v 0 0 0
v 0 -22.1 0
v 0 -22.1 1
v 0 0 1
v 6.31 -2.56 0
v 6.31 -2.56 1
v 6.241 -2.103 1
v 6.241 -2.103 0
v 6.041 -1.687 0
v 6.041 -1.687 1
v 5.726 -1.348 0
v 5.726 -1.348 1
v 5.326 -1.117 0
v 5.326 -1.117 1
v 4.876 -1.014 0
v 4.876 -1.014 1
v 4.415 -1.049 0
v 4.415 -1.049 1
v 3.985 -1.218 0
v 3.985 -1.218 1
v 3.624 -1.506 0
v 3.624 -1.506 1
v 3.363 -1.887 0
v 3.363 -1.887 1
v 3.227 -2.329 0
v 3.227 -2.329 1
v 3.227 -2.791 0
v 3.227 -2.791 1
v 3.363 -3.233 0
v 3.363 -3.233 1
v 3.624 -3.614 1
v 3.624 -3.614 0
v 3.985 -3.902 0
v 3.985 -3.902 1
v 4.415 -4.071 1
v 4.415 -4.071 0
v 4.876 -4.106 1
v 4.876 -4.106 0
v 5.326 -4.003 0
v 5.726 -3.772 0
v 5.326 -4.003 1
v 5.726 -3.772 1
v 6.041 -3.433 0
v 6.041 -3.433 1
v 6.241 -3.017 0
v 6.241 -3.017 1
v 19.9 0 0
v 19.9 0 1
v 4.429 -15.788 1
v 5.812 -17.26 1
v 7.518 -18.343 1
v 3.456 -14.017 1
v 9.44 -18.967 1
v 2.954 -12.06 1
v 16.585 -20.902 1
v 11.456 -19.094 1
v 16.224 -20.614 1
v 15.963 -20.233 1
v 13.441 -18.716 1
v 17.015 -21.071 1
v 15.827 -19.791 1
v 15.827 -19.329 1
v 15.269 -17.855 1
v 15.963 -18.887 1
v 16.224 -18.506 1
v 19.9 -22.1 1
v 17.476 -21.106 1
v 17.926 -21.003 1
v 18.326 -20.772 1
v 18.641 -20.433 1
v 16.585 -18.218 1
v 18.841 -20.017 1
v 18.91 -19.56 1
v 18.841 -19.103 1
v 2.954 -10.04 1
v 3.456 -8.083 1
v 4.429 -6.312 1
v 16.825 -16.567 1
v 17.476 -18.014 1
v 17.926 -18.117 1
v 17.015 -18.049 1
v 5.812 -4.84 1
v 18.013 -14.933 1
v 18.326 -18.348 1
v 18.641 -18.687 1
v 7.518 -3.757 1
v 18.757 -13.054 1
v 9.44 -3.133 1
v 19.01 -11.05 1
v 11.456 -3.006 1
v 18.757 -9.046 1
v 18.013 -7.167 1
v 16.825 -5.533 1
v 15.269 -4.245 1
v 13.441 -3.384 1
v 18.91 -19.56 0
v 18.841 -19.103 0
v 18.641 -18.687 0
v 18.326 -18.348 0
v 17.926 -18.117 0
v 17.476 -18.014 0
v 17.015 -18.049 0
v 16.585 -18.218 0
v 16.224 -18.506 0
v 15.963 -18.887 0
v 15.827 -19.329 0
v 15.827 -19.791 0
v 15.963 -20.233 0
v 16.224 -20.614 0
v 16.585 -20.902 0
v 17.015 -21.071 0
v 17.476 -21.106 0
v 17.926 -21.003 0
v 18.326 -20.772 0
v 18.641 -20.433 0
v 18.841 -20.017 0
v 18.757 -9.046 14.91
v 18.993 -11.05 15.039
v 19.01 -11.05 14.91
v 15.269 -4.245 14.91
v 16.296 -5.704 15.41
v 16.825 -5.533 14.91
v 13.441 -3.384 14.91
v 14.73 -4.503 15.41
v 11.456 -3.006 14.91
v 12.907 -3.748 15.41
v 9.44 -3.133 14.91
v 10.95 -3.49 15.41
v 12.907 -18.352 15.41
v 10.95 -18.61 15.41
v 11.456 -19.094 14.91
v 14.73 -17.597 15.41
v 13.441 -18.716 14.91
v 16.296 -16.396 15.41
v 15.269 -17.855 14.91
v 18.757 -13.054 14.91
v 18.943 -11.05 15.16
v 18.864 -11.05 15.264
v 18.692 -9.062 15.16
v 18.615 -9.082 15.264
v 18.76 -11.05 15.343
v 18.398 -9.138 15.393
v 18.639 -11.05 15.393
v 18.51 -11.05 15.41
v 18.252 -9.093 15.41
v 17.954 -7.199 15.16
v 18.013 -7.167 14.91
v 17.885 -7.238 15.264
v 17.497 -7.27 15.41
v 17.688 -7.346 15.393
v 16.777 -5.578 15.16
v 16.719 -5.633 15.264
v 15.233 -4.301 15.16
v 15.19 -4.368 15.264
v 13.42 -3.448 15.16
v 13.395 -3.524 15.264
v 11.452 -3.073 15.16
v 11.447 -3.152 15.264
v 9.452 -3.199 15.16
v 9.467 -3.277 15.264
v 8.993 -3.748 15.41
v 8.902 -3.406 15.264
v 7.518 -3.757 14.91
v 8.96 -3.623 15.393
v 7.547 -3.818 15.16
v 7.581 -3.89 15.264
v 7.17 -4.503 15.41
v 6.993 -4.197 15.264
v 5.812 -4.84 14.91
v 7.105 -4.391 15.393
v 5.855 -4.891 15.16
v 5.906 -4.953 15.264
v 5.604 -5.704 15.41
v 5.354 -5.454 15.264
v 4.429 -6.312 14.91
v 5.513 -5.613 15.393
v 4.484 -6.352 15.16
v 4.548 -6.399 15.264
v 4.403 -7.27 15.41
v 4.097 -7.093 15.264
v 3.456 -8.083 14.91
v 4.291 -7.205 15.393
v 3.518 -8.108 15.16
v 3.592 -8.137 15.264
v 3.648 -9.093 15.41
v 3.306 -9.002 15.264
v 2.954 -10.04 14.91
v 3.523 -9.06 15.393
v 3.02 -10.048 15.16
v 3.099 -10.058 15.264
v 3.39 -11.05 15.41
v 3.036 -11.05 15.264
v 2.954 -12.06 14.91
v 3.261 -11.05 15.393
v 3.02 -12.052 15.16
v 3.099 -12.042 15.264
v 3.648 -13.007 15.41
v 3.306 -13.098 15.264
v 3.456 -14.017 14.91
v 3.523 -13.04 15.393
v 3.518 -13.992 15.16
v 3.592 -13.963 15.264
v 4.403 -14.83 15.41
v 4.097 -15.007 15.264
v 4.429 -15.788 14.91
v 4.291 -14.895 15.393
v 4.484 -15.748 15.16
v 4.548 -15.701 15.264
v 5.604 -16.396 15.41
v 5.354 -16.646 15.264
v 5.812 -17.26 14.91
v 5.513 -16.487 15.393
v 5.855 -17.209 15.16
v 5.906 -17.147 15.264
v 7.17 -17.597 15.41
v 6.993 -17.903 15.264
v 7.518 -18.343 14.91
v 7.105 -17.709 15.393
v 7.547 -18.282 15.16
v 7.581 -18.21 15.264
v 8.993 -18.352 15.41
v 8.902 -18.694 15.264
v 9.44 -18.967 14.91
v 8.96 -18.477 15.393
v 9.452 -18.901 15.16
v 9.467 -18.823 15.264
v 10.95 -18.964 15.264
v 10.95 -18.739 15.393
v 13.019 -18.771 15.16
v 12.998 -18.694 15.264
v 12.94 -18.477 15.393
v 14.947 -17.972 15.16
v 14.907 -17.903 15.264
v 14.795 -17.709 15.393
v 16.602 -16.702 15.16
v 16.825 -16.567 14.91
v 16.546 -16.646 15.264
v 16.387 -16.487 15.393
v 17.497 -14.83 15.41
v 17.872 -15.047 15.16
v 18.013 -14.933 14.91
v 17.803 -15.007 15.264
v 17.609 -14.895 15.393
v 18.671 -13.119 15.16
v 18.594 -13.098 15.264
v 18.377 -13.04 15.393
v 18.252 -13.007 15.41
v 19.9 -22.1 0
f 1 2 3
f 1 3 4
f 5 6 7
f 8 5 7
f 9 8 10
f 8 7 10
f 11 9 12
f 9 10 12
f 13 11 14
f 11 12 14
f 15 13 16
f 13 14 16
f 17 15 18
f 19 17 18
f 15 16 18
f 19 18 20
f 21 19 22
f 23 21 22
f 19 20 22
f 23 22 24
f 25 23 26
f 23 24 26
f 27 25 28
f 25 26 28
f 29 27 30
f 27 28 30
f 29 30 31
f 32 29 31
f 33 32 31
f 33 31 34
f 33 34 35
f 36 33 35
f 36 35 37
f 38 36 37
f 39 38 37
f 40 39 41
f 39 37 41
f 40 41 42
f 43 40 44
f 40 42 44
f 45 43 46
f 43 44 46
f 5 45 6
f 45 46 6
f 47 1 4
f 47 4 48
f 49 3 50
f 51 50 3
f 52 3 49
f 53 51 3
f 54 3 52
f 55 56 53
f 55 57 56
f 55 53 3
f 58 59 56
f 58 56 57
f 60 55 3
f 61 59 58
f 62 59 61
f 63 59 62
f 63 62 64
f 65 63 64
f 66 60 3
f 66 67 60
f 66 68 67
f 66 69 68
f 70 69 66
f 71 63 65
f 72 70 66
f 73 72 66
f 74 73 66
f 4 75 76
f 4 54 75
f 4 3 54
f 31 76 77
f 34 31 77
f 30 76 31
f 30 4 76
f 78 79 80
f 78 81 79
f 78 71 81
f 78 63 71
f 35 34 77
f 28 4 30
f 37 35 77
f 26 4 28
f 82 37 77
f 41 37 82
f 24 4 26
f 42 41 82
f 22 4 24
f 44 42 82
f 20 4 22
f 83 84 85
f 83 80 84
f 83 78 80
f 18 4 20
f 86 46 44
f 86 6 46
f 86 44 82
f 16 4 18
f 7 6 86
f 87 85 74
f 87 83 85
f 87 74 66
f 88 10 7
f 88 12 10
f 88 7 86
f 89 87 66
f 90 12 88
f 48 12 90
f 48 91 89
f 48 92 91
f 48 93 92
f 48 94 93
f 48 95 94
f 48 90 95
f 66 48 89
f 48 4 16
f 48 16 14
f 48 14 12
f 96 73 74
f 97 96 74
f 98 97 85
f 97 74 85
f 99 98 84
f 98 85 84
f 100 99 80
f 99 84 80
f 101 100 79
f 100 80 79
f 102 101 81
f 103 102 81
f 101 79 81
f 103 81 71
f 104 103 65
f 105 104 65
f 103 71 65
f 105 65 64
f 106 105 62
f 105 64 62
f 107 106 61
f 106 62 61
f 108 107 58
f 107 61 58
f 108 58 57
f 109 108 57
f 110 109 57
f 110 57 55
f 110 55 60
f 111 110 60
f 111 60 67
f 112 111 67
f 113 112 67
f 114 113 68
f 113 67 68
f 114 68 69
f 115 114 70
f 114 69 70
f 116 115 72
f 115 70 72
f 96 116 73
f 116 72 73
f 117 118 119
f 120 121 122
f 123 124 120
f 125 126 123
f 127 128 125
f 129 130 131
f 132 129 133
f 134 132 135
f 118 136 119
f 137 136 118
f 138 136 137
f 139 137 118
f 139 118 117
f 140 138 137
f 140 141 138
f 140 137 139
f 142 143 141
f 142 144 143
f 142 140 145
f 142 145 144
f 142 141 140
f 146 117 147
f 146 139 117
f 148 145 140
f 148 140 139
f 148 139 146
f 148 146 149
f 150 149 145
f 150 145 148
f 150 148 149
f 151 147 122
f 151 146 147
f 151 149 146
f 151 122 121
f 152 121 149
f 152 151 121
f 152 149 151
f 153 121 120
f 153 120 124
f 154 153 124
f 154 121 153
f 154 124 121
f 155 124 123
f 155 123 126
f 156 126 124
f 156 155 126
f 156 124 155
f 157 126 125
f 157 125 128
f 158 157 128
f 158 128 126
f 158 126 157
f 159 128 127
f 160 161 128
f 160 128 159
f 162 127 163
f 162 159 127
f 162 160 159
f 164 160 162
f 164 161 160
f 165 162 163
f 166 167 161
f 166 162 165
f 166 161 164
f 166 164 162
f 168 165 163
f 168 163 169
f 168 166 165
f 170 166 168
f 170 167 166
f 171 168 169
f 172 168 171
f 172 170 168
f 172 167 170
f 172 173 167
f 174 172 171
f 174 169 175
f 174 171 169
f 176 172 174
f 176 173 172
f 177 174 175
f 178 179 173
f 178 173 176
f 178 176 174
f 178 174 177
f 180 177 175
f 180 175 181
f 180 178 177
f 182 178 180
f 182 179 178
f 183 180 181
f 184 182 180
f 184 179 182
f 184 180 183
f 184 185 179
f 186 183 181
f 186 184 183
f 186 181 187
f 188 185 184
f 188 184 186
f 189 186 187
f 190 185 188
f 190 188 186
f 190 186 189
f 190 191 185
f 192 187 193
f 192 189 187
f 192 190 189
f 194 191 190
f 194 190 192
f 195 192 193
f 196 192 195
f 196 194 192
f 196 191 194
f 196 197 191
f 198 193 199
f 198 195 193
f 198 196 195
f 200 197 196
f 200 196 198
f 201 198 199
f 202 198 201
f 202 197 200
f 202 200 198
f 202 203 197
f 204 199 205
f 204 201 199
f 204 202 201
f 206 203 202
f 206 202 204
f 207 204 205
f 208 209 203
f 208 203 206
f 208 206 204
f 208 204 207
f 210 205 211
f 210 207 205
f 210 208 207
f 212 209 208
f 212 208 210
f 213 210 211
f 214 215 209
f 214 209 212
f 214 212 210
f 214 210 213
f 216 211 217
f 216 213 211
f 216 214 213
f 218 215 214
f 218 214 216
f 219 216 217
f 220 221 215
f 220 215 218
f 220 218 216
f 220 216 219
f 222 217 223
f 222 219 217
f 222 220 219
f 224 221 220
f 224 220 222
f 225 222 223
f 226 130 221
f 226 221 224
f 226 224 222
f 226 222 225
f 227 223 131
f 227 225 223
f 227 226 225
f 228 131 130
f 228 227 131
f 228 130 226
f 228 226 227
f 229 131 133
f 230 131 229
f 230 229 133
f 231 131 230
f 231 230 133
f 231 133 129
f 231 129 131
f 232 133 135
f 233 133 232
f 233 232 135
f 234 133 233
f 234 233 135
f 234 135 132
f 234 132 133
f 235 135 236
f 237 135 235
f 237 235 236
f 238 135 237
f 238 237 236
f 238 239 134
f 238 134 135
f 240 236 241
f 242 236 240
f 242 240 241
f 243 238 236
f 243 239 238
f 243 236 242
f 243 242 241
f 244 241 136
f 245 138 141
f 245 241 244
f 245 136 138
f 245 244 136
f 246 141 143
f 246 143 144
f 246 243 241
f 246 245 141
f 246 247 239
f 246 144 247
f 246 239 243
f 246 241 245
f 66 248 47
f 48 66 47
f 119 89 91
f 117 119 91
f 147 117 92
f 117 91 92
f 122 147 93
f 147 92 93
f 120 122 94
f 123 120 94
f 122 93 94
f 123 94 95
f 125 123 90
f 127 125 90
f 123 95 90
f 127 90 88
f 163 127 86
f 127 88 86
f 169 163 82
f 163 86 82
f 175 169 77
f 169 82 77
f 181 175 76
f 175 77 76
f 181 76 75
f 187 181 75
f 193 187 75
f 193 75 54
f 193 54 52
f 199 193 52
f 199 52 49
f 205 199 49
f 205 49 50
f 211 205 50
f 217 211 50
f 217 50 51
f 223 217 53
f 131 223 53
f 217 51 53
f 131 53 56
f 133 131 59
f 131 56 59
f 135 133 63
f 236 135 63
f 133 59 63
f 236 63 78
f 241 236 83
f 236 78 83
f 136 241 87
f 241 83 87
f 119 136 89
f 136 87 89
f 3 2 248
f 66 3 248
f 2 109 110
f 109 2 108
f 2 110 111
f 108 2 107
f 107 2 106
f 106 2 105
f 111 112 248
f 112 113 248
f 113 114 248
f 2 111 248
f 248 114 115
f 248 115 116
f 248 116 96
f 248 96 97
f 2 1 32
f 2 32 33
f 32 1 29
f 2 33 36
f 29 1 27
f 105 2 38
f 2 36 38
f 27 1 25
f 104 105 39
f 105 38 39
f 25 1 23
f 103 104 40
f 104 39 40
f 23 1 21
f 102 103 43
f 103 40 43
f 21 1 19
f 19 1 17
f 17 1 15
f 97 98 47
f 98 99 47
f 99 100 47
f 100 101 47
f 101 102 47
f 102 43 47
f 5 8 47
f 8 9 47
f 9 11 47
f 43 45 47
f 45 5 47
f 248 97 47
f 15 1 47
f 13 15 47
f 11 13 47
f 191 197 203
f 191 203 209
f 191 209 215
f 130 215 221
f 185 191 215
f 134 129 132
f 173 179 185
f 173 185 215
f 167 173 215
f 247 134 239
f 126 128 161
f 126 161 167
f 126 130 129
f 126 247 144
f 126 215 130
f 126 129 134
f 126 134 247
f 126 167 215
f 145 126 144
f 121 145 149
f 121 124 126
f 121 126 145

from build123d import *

# Parameters (mm, degrees)
SKETCH1_W      = 19.9
SKETCH1_H      = 22.1
EXTRUDE1_DEPTH = 1
SKETCH2_R      = 1.55
EXTRUDE2_DEPTH = 1
SKETCH3_R      = 8.06
EXTRUDE3_DEPTH = 14.41
FILLET1_R      = 0.5


with BuildPart() as part:
    # Sketch1 → Extrude1 (new body)
    with BuildSketch(Plane.XY):
        with Locations((9.95, -11.05)):
            Rectangle(SKETCH1_W, SKETCH1_H)
    extrude(amount=EXTRUDE1_DEPTH)

    # Sketch2 → Extrude2 (cut)
    with BuildSketch(Plane.XY.offset(1)):
        with Locations((4.76, -2.56)):
            Circle(SKETCH2_R)
        with Locations((17.36, -19.56)):
            Circle(SKETCH2_R)
    extrude(amount=-EXTRUDE2_DEPTH, mode=Mode.SUBTRACT)

    # Sketch3 → Extrude3 (add)
    with BuildSketch(Plane.XY.offset(1)):
        with Locations((10.95, -11.05)):
            Circle(SKETCH3_R)
    extrude(amount=EXTRUDE3_DEPTH)

    # Fillet1
    fillet1_edges = [part.edges().sort_by_distance(p)[0] for p in [
        (2.89, -11.05, 15.41),
    ]]
    fillet(fillet1_edges, radius=FILLET1_R)


solid = part.part
